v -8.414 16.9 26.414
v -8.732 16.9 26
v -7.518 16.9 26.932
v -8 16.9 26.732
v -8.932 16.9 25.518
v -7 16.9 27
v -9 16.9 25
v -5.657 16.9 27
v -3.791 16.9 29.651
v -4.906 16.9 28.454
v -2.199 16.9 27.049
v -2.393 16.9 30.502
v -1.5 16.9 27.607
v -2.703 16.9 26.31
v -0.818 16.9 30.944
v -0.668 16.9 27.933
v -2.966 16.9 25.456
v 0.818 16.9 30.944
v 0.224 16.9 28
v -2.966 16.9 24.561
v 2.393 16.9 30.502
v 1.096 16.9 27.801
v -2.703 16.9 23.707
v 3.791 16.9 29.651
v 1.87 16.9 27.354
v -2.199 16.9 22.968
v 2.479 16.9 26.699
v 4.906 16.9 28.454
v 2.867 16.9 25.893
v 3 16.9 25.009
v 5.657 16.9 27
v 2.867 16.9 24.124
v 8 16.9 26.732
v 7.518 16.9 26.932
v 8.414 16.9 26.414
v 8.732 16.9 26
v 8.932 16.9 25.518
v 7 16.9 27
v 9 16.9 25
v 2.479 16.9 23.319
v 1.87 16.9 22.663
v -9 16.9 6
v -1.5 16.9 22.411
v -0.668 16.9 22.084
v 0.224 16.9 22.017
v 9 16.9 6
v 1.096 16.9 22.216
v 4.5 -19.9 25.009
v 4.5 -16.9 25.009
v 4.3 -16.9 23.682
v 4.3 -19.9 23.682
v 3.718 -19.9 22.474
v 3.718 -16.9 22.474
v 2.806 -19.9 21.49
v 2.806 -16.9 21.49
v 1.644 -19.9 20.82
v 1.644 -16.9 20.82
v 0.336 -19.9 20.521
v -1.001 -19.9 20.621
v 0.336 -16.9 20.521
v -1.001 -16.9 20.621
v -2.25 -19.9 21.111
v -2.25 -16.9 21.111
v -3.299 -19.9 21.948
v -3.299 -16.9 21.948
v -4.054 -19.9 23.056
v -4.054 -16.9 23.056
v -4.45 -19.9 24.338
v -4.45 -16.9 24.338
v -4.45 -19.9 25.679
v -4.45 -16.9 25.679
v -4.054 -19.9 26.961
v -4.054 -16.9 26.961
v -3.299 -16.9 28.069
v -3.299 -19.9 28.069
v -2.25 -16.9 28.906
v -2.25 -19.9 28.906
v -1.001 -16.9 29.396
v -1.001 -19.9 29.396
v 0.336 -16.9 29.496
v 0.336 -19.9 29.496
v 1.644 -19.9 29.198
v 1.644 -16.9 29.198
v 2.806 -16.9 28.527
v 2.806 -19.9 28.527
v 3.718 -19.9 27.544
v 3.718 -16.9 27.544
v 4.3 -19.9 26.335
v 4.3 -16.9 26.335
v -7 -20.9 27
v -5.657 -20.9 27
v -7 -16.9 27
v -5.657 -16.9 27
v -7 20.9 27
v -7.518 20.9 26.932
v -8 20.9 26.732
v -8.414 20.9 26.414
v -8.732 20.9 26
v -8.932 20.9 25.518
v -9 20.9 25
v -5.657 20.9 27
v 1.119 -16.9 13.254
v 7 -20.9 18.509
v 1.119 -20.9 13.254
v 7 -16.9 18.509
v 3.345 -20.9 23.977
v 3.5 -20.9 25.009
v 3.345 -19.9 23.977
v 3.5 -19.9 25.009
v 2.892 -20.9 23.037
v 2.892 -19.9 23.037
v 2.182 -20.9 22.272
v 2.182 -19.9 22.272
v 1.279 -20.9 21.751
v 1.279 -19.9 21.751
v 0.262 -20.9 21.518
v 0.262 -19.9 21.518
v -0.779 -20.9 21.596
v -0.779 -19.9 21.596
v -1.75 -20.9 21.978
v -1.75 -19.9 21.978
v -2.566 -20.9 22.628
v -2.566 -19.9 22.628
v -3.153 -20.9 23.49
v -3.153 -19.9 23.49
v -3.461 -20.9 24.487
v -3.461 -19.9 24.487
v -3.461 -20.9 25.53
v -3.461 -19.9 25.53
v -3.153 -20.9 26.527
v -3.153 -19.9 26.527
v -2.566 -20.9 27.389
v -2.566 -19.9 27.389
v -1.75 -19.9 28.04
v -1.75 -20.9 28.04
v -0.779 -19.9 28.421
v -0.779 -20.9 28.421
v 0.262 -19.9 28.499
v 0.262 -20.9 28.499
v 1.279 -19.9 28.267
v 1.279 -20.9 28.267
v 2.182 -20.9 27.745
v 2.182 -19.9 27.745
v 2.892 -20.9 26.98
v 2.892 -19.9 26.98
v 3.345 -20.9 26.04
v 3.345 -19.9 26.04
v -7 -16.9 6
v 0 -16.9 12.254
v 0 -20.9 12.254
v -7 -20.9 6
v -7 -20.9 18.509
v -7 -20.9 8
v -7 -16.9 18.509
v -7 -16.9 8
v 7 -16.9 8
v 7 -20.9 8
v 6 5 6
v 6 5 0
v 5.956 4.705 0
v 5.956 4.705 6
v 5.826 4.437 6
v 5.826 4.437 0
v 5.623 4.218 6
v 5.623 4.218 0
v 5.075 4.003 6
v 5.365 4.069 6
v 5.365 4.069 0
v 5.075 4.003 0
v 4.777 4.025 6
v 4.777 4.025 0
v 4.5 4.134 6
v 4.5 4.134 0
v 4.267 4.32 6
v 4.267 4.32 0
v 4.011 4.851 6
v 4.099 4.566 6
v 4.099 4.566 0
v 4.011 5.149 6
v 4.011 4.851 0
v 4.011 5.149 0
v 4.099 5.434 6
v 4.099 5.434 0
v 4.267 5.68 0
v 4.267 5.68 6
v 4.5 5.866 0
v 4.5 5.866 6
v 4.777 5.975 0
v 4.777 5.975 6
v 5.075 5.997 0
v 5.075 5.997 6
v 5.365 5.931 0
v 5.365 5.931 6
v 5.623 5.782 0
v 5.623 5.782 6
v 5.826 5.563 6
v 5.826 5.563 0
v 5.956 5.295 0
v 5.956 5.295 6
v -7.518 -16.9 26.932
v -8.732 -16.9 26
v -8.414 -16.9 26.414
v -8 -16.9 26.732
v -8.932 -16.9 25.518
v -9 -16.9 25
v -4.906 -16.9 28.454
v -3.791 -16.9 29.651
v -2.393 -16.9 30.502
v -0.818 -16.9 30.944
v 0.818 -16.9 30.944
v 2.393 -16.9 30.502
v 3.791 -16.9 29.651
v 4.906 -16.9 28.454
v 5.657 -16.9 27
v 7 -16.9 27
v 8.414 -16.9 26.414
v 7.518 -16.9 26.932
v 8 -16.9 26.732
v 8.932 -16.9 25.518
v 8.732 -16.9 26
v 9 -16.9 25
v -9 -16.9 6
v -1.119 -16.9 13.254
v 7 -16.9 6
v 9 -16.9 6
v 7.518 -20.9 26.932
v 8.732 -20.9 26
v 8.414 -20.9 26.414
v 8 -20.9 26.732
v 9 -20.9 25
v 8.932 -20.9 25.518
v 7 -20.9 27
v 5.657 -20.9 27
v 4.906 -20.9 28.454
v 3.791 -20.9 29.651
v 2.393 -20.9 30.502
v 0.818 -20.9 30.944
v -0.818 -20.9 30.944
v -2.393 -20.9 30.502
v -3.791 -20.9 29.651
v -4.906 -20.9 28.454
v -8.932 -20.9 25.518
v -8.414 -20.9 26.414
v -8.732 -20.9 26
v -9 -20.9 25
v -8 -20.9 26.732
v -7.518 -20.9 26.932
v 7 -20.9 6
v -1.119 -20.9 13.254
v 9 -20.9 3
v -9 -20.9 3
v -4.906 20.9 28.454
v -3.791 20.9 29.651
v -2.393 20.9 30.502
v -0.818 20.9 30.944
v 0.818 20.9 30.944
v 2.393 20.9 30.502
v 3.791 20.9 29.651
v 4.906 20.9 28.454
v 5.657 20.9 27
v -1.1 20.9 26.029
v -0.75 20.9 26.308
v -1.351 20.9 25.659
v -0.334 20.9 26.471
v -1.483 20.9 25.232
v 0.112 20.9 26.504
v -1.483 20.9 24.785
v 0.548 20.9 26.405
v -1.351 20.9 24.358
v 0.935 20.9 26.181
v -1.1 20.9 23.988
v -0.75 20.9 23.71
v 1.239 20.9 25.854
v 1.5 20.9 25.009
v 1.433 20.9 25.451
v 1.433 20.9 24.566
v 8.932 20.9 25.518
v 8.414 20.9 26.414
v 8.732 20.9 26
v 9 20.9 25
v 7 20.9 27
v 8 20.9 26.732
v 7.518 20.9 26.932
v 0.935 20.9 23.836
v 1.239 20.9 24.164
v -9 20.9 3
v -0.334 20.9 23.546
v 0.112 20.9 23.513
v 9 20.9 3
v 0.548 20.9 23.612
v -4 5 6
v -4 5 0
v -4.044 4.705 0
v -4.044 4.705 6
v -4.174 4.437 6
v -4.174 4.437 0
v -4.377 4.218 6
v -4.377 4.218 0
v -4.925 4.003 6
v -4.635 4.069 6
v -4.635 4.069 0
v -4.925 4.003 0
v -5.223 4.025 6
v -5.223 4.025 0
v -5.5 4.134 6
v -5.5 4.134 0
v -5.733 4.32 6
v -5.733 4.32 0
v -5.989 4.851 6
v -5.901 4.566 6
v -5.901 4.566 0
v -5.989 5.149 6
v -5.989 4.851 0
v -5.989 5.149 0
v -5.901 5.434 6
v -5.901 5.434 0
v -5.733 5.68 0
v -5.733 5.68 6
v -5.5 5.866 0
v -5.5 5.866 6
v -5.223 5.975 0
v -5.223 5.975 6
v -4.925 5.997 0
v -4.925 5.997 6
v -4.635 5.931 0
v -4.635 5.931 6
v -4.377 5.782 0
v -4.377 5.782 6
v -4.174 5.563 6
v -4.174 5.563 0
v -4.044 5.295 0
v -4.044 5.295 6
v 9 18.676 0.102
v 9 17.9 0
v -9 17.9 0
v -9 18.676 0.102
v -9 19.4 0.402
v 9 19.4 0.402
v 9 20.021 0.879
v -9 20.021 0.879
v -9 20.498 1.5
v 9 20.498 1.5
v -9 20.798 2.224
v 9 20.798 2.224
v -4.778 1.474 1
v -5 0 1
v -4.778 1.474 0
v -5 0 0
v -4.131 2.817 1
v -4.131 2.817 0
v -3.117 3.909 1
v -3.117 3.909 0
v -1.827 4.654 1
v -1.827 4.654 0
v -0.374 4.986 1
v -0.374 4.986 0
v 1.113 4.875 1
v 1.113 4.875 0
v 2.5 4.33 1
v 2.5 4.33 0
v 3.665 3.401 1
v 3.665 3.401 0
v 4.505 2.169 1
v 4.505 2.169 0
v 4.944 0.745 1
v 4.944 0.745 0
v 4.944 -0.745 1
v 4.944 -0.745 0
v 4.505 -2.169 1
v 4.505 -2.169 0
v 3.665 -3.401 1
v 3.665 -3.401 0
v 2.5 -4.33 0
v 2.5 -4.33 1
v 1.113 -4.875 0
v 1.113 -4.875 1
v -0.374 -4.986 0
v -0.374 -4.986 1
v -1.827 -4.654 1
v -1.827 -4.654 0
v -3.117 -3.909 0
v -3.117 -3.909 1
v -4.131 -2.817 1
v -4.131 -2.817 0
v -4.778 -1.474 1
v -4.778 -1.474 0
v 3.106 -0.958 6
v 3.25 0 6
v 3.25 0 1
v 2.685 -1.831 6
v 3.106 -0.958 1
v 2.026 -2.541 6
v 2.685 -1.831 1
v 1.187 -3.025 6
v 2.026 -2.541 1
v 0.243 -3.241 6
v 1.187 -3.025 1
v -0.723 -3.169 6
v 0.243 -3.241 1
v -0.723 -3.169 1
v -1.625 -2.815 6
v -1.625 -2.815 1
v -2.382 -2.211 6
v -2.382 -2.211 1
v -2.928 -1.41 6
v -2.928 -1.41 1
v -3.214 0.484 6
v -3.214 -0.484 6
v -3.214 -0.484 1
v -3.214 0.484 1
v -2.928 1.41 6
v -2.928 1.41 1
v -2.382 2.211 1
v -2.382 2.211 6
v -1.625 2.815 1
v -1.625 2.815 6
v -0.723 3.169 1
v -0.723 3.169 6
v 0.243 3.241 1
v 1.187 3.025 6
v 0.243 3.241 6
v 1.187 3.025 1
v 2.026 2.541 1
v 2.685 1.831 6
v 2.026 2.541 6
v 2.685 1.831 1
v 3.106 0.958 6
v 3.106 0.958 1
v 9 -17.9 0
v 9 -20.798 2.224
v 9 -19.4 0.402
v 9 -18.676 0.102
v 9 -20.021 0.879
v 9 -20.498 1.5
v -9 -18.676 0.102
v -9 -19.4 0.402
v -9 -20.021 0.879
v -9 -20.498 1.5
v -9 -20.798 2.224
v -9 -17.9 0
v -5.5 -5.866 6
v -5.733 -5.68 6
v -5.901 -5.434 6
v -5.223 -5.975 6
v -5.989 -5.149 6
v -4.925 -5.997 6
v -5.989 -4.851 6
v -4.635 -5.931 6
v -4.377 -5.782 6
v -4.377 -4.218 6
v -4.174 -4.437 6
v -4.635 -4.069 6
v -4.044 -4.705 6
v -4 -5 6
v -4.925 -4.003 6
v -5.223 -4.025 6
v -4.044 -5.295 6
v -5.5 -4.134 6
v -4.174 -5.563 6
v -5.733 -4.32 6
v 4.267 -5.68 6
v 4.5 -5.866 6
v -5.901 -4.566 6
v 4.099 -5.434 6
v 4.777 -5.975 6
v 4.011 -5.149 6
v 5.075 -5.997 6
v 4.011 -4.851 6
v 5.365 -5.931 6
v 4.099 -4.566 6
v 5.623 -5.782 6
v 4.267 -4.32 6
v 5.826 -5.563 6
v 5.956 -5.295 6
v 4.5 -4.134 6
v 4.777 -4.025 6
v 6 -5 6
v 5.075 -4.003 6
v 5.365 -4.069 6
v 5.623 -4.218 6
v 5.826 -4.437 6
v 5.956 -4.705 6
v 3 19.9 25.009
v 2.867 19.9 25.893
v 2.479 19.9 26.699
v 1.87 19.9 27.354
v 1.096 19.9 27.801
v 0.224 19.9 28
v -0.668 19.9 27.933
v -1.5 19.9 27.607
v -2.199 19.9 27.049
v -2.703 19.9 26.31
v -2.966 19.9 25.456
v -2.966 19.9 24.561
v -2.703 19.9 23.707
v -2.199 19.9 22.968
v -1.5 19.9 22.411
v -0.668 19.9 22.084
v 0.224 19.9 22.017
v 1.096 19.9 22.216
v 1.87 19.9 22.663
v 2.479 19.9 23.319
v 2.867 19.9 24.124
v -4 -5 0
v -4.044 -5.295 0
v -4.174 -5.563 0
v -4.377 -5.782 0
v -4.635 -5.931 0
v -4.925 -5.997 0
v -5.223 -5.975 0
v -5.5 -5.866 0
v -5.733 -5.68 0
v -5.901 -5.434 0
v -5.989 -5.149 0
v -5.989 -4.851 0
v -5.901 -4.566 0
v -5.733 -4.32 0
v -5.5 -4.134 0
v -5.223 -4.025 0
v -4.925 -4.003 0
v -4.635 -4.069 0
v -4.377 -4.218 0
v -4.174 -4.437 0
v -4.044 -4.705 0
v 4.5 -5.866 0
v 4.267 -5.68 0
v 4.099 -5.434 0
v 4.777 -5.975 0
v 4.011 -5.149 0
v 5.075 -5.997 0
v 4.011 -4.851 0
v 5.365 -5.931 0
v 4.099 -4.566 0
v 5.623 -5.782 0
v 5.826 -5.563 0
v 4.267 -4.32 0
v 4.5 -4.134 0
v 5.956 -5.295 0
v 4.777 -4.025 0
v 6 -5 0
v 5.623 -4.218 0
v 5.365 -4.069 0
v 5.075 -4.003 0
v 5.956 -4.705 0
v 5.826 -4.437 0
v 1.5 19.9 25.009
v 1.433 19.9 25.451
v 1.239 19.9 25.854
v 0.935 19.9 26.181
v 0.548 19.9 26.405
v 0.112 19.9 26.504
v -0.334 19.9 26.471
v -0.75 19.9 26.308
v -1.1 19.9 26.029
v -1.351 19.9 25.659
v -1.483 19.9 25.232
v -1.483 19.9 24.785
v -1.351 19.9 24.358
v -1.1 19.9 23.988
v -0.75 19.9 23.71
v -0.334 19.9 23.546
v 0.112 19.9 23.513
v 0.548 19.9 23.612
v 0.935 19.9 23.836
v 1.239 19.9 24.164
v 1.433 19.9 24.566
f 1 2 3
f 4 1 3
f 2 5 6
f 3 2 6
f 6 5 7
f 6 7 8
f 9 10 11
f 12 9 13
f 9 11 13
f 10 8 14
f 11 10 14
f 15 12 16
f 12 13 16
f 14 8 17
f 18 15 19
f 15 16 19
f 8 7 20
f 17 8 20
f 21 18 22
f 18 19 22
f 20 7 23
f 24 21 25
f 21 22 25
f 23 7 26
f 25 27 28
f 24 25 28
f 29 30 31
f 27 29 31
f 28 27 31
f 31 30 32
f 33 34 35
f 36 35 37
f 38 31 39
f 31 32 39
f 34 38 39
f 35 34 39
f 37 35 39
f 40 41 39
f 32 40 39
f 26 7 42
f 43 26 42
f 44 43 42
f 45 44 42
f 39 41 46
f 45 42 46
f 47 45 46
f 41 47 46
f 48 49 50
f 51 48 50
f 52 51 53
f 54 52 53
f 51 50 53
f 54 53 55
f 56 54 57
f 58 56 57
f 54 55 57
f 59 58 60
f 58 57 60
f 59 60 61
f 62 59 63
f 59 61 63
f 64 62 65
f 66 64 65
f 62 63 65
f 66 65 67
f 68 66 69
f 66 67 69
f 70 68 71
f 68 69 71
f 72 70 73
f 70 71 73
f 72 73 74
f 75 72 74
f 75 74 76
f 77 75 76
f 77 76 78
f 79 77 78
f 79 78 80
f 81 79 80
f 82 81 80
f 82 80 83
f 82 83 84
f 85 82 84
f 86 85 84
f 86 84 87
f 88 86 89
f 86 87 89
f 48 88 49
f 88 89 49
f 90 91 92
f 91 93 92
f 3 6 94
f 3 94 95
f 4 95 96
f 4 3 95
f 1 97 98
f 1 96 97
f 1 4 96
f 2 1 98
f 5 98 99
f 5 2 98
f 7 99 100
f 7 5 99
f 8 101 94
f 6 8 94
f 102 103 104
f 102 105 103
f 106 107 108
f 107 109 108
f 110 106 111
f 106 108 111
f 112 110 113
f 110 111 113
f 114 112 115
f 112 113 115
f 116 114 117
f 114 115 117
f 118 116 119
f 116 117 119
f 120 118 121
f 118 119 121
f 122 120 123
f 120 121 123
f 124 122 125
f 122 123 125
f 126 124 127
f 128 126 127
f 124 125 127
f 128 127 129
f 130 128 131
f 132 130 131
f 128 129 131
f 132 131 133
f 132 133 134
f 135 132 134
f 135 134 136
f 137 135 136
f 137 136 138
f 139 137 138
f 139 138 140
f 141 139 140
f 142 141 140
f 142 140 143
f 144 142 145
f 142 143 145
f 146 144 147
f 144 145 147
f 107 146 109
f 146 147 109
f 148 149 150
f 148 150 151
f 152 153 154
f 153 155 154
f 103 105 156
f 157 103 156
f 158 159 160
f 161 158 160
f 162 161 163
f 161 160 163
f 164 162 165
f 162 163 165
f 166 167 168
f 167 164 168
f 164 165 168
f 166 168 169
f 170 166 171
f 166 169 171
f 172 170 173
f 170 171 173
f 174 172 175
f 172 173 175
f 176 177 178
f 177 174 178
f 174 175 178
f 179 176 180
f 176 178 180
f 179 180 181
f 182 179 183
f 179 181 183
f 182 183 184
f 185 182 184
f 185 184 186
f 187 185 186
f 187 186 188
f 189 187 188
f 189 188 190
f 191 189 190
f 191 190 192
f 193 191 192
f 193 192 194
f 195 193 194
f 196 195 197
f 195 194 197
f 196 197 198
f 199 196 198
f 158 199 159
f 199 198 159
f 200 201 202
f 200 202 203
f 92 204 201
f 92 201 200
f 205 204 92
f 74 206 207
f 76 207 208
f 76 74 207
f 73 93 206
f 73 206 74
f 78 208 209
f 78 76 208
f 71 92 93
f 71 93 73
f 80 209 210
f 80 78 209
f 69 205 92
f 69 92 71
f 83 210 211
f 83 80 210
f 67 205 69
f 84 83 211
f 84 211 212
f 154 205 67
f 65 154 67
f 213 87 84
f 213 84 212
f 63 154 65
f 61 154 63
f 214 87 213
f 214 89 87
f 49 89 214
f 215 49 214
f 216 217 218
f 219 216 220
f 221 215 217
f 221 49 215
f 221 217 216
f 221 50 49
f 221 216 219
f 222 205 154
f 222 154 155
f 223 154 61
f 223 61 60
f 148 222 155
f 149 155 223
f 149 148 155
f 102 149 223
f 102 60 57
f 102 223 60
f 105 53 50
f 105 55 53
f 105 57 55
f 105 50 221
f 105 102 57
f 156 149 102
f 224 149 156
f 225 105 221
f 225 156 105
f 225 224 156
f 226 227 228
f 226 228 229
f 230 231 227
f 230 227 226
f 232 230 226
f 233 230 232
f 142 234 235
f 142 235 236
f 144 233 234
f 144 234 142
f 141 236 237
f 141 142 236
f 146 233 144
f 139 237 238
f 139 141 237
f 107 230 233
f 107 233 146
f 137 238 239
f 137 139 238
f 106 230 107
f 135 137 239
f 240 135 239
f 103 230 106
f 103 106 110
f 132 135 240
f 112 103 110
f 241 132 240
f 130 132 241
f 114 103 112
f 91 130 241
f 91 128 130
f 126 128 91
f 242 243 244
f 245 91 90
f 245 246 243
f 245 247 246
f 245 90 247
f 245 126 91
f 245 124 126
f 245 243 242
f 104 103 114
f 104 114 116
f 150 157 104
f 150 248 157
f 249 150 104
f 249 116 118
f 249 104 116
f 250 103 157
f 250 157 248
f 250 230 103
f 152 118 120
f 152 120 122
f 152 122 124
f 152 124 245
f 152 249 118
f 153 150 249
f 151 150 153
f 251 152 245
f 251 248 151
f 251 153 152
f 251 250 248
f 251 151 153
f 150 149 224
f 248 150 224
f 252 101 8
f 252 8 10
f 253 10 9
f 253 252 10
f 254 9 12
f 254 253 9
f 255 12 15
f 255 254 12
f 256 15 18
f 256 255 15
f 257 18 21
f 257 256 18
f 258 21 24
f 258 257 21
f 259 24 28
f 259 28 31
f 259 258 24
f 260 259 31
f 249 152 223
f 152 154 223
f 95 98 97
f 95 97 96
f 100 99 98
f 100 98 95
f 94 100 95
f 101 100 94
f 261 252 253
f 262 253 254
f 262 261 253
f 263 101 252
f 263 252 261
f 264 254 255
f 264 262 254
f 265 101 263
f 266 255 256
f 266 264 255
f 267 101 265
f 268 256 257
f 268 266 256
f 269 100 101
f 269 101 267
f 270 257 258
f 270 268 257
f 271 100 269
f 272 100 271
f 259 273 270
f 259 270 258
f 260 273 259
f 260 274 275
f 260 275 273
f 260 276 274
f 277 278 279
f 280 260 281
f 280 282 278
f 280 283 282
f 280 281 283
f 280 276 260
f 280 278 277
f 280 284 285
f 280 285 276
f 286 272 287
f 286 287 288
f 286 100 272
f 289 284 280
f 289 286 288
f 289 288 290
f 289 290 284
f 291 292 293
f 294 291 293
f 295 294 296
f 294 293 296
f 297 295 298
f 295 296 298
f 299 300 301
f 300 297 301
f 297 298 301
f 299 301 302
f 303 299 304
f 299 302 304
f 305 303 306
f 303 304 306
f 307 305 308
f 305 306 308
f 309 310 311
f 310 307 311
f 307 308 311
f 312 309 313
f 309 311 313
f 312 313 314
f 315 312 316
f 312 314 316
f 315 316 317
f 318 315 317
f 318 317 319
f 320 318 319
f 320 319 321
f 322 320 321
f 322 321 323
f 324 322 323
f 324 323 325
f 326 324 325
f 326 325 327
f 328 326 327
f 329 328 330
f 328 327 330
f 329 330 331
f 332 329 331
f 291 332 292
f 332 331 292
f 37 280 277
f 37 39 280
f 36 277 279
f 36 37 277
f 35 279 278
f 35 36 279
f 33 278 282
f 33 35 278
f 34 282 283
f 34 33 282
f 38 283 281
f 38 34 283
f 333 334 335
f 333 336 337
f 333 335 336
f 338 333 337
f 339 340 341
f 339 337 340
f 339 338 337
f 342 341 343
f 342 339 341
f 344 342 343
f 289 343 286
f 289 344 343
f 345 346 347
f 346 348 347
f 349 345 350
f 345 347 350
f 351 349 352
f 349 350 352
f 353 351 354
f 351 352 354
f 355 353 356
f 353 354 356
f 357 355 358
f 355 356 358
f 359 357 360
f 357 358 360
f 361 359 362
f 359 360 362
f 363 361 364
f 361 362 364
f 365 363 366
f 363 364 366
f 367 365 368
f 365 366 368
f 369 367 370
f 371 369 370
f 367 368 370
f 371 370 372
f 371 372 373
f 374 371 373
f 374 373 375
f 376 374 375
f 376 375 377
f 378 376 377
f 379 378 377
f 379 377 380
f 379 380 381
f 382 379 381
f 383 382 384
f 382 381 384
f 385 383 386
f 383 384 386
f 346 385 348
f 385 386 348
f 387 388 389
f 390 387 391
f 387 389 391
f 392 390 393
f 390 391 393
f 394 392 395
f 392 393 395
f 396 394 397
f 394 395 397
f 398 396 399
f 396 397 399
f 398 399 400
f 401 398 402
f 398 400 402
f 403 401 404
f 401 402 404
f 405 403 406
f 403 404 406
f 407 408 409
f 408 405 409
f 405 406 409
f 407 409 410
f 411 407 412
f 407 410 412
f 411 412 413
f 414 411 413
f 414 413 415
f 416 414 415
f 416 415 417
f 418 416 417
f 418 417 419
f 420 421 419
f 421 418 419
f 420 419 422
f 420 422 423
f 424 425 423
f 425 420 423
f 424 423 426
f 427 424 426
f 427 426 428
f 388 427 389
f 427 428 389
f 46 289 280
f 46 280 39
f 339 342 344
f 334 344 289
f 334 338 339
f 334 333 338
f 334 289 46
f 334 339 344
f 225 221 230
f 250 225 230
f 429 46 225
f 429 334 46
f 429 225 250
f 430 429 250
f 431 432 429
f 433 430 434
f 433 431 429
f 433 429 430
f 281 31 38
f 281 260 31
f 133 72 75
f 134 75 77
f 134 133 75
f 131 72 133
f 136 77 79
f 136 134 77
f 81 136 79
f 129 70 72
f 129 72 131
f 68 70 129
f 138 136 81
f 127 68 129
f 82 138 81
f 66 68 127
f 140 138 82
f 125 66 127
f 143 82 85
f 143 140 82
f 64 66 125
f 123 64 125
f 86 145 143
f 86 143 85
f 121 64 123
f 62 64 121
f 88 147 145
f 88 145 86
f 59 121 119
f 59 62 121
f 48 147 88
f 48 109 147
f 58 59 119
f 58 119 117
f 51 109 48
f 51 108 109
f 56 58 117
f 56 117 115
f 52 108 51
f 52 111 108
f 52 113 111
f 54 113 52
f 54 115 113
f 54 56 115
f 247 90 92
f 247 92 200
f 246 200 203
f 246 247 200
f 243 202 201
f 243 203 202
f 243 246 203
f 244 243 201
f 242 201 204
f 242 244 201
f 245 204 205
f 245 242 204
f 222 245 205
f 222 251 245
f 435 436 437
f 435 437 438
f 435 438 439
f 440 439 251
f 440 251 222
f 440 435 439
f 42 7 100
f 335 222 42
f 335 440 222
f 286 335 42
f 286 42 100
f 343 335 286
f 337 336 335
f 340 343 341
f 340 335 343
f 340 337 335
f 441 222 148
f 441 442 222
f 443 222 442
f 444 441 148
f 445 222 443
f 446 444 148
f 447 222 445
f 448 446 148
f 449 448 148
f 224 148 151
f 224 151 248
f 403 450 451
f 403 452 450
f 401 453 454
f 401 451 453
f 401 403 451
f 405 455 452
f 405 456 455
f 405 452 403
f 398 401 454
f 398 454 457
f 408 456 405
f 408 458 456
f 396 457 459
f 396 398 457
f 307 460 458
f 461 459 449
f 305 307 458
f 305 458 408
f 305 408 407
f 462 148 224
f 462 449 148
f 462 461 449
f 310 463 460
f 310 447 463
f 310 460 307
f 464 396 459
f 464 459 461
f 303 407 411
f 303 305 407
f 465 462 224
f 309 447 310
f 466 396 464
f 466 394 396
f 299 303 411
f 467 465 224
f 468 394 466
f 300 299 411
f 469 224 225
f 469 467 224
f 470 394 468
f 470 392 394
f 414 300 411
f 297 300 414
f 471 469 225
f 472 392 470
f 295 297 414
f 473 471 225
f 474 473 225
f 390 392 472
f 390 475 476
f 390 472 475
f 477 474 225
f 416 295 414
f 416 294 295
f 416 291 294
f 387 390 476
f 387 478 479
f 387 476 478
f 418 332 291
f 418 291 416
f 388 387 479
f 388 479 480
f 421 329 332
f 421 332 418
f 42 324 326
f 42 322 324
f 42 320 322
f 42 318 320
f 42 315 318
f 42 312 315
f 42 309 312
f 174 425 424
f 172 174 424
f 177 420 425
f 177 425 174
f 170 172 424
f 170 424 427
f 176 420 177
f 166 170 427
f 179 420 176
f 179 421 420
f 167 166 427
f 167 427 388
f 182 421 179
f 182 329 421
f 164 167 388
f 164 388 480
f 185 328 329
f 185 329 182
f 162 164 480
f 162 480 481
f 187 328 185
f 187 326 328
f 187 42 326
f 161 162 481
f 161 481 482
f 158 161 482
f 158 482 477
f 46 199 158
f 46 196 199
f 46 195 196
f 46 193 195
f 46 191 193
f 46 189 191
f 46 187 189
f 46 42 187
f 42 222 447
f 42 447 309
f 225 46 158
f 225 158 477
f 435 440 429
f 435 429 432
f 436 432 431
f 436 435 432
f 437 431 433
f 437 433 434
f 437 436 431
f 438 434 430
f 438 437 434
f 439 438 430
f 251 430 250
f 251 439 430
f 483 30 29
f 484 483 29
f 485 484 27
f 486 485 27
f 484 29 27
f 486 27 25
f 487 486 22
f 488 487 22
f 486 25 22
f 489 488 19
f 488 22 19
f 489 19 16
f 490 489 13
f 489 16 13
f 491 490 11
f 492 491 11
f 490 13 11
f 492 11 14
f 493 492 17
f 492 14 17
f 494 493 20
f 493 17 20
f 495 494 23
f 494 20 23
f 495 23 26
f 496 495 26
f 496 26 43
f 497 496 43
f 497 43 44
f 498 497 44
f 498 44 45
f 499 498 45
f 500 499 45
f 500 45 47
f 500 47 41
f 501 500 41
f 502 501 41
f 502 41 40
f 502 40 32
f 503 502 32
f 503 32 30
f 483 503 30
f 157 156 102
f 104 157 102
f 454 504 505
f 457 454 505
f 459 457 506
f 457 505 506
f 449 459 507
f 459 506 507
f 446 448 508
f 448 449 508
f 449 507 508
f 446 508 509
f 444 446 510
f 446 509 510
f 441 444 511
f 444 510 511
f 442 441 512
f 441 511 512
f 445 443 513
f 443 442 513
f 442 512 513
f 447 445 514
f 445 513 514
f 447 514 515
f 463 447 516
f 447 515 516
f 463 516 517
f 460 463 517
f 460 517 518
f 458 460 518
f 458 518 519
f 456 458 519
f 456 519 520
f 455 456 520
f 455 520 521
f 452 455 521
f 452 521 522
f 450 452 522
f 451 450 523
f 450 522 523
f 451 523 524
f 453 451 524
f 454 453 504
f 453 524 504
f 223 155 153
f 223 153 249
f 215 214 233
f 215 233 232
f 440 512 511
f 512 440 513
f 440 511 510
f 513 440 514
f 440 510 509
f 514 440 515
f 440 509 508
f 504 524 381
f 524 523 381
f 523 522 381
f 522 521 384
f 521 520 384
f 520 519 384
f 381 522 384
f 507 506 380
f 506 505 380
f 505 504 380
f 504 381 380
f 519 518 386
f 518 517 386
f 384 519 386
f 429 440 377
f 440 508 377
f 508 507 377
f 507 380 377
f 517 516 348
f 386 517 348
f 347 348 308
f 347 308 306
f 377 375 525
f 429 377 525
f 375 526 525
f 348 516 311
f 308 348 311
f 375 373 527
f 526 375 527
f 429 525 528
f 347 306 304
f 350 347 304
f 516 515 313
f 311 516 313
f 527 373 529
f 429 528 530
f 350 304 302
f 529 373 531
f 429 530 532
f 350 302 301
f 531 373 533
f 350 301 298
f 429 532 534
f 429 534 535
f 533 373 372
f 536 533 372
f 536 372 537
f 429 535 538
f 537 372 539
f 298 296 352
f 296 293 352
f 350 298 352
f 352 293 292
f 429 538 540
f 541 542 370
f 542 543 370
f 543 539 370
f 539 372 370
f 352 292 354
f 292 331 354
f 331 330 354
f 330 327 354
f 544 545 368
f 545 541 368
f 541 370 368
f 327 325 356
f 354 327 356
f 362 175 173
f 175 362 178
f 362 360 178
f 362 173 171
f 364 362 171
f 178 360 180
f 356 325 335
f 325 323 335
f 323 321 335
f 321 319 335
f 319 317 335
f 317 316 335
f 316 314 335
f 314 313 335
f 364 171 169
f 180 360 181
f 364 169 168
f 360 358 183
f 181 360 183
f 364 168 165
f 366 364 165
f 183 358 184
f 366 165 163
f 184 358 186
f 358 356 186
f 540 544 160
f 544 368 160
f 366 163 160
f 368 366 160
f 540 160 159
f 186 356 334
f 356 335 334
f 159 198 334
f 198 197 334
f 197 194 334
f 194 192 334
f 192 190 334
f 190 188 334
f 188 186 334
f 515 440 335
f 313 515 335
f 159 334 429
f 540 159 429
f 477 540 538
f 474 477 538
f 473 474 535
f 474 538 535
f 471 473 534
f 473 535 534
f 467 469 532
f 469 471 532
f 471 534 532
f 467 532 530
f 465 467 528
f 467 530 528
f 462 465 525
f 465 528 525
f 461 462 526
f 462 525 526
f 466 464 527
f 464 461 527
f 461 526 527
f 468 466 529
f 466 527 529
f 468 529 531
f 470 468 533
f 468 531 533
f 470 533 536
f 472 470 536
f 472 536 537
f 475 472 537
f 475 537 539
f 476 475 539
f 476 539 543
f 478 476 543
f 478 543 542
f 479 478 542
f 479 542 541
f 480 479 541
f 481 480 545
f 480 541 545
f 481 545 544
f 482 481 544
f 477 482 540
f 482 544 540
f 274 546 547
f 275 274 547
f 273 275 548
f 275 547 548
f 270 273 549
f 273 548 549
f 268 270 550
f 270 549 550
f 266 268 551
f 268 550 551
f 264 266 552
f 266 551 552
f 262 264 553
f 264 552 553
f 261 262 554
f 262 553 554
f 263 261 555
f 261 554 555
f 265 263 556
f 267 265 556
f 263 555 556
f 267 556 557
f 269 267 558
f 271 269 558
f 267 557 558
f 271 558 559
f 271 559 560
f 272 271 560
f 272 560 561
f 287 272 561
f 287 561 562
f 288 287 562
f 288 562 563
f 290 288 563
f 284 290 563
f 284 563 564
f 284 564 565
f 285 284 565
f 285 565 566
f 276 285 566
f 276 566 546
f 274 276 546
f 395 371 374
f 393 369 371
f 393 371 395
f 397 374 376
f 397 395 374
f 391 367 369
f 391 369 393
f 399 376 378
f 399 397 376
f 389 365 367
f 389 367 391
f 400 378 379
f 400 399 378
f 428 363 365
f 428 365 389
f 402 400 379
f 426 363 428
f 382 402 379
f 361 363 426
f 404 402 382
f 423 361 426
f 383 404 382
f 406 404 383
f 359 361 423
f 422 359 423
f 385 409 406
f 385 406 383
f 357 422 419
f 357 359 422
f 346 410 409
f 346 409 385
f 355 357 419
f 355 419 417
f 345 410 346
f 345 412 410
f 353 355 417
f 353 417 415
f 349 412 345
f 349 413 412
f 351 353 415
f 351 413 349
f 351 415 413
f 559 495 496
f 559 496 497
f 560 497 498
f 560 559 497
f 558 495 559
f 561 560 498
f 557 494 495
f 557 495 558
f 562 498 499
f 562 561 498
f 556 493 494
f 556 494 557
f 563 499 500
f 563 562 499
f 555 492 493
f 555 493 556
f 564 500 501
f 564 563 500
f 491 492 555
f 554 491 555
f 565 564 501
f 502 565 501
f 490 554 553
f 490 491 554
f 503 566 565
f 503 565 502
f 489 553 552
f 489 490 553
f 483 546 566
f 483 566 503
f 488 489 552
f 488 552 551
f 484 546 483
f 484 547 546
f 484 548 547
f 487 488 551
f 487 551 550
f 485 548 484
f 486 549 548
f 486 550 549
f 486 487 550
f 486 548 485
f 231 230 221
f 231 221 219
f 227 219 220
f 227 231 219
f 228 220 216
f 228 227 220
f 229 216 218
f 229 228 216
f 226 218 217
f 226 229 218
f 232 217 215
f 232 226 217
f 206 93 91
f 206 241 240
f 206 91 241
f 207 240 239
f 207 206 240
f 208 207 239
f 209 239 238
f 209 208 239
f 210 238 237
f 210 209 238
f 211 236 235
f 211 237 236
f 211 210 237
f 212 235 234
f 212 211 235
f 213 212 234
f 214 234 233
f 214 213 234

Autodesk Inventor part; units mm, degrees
ref_plane "YZ Plane" through (0, 0, 0) normal (1, 0, 0) x (0, 1, 0)
ref_plane "XZ Plane" through (0, 0, 0) normal (0, 1, 0) x (-1, 0, 0)
ref_plane "XY Plane" through (0, 0, 0) normal (0, 0, 1) x (1, 0, 0)
sketch "スケッチ1" plane through (0, 0, 0) normal (0, 0, 1) x (1, 0, 0)
  line L0 (-9, 20.9) -> (9, 20.9)
  line L1 (9, 20.9) -> (9, -20.9)
  line L2 (9, -20.9) -> (-9, -20.9)
  line L3 (-9, -20.9) -> (-9, 20.9)
  line L4 (-9, 20.9) -> (9, -20.9) construction
  line L5 (9, 20.9) -> (-9, -20.9) construction
  circle A0 centre (0, 0) radius 3.25
  line L6 (-5, 5) -> (5, 5) construction
  line L7 (5, 5) -> (5, -5) construction
  line L8 (5, -5) -> (-5, -5) construction
  line L9 (-5, -5) -> (-5, 5) construction
  line L10 (-5, 5) -> (5, -5) construction
  line L11 (5, 5) -> (-5, -5) construction
  circle A1 centre (5, 5) radius 1
  circle A2 centre (-5, 5) radius 1
  circle A3 centre (-5, -5) radius 1
  circle A4 centre (5, -5) radius 1
  dimension "d0" = 18
  dimension "d1" = 41.8
  dimension "d2" = 6.5
  dimension "d3" = 10
  dimension "d4" = 10
  dimension "d5" = 2
  dimension "d6" = 2
  dimension "d7" = 2
  dimension "d8" = 2
extrude "押し出し1" add sketch "スケッチ1" along normal blind 6
sketch "スケッチ2" plane through (0, 0, 6) normal (0, 0, 1) x (1, 0, 0)
  line L0 (-9, 20.9) -> (9, 20.9)
  line L1 (-9, 9) -> (-9, 20.9)
  line L2 (9, 20.9) -> (-9, 20.9)
  line L3 (-9, 20.9) -> (-9, 16.9)
  line L4 (-9, 16.9) -> (9, 16.9)
  line L5 (9, 16.9) -> (9, 20.9)
  line L6 (9, -9) -> (9, -20.9)
  line L7 (-9, -20.9) -> (-9, -9)
  line L8 (9, -20.9) -> (-9, -20.9)
  line L9 (-9, -20.9) -> (-9, -16.9)
  line L10 (-9, -16.9) -> (9, -16.9)
  line L11 (9, -16.9) -> (9, -20.9)
  point P0 (0, 0)
  point P1 (0, 0)
  dimension "d11" = 4
  dimension "d12" = 4
extrude "押し出し2" add sketch "スケッチ2" along normal blind 25
sketch "スケッチ3" plane through (-9, 20.9, 0) normal (0, 1, 0) x (1, 0, 0)
  line L0 (18, -31) -> (18, 0)
  line L1 (0, 0) -> (18, 0)
  line L2 (18, 0) -> (0, 0)
  line L3 (18, -31) -> (18, -25) construction
  line L4 (18, -25) -> (18, -31)
  line L5 (9, -25) -> (15, -25) construction
  line L6 (9, -25) -> (18, -25) construction
  line L7 (16, -27) -> (18, -27)
  line L8 (14.6569, -27) -> (16, -27)
  line L9 (9, -25) -> (9, -31) construction
  line L10 (2, -27) -> (3.3431, -27)
  line L11 (9, -25) -> (0, -25) construction
  line L12 (0, -25) -> (0, -31) construction
  line L13 (0, -25) -> (0, -31)
  circle A0 centre (9, -25) radius 6
  line L14 (18, -6) -> (18, -31)
  line L15 (0, -6) -> (0, -31) construction
  line L16 (18, 0) -> (18, -31) construction
  line L17 (9, 0) -> (9, -25) construction
  line L18 (0, 0) -> (0, -31)
  line L19 (0, -6) -> (0, -31) construction
  line L20 (18, -31) -> (0, -31) construction
  line L21 (0, -31) -> (18, -31) construction
  line L22 (0, -31) -> (18, -31)
  line L23 (18, -31) -> (0, -31) construction
  line L24 (0, -31) -> (18, -31) construction
  line L25 (0, -25) -> (2, -25) construction
  line L26 (2, -25) -> (0, -25) construction
  line L27 (18, -25) -> (16, -25) construction
  line L28 (2, -27) -> (0, -27)
  line L29 (18, -31) -> (18, 0)
  line L30 (0, 0) -> (18, 0)
  line L31 (18, 0) -> (0, 0)
  line L32 (18, -31) -> (18, -25) construction
  line L33 (18, -25) -> (18, -31)
  line L34 (9, -25) -> (15, -25) construction
  line L35 (9, -25) -> (18, -25) construction
  line L36 (16, -27) -> (18, -27)
  line L37 (14.6569, -27) -> (16, -27)
  line L38 (9, -25) -> (9, -31) construction
  line L39 (2, -27) -> (3.3431, -27)
  line L40 (9, -25) -> (0, -25) construction
  line L41 (0, -25) -> (0, -31) construction
  line L42 (0, -25) -> (0, -31)
  circle A1 centre (9, -25) radius 6
  line L43 (18, -6) -> (18, -31)
  line L44 (0, -6) -> (0, -31) construction
  line L45 (18, 0) -> (18, -31) construction
  line L46 (9, 0) -> (9, -25) construction
  line L47 (0, 0) -> (0, -31)
  line L48 (0, -6) -> (0, -31) construction
  line L49 (18, -31) -> (0, -31) construction
  line L50 (0, -31) -> (18, -31) construction
  line L51 (0, -31) -> (18, -31)
  line L52 (18, -31) -> (0, -31) construction
  line L53 (0, -31) -> (18, -31) construction
  line L54 (0, -25) -> (2, -25) construction
  line L55 (2, -25) -> (0, -25) construction
  line L56 (18, -25) -> (16, -25) construction
  line L57 (2, -27) -> (0, -27)
  point P0 (9, -6)
  point P1 (9, -6)
extrude "押し出し3" cut sketch "スケッチ3" against normal blind 42 contours L22 A0 L8 L7 L0 | L22 L13 L28 L10 A0
sketch "スケッチ4" plane through (-9, 16.9, 6) normal (0, -1, 0) x (1, 0, 0)
  line L0 (0, 25.0086) -> (0, 19.0086)
  line L1 (0, 25.0086) -> (0, 19.0086) construction
  line L2 (0, 19.0086) -> (0, 25.0086)
  line L3 (9, 19.0086) -> (3, 19.0086) construction
  line L4 (9, 19.0086) -> (0, 19.0086) construction
  line L5 (2, 21.0086) -> (0, 21.0086)
  line L6 (3.3431, 21.0086) -> (2, 21.0086)
  line L7 (9, 19.0086) -> (9, 25.0086) construction
  line L8 (16, 21.0086) -> (14.6569, 21.0086)
  line L9 (9, 19.0086) -> (18, 19.0086) construction
  line L10 (18, 19.0086) -> (18, 25.0086) construction
  line L11 (18, 19.0086) -> (18, 25.0086)
  circle A0 centre (9, 19.0086) radius 6
  line L12 (0, 19.0086) -> (0, 25.0086)
  line L13 (18, 19.0086) -> (18, 25.0086) construction
  line L14 (0, 19.0086) -> (0, 25.0086) construction
  line L15 (9, 0) -> (9, 25) construction
  line L16 (18, 19.0086) -> (18, 25.0086)
  line L17 (18, 0.0086) -> (18, 25.0086) construction
  line L18 (0, 25.0086) -> (18, 25.0086) construction
  line L19 (18, 25.0086) -> (0, 25.0086) construction
  line L20 (18, 25.0086) -> (0, 25.0086)
  line L21 (0, 25.0086) -> (18, 25.0086) construction
  line L22 (18, 25.0086) -> (0, 25.0086) construction
  line L23 (18, 19.0086) -> (16, 19.0086) construction
  line L24 (16, 19.0086) -> (18, 19.0086) construction
  line L25 (0, 19.0086) -> (2, 19.0086) construction
  line L26 (16, 21.0086) -> (18, 21.0086)
  circle A1 centre (9, 19.0086) radius 1.5
  circle A2 centre (9, 19.0086) radius 3
  point P0 (9, -6)
  point P1 (9, 0.0086)
  dimension "d17" = 3
  dimension "d18" = 6
extrude "押し出し4" cut sketch "スケッチ4" against normal blind 3 contours A2
sketch "スケッチ5" plane through (-9, 16.9, 6) normal (0, -1, 0) x (1, 0, 0)
  line L0 (0, 25.0086) -> (0, 19.0086)
  line L1 (0, 25.0086) -> (0, 19.0086) construction
  line L2 (0, 19.0086) -> (0, 25.0086)
  line L3 (9, 19.0086) -> (3, 19.0086) construction
  line L4 (9, 19.0086) -> (0, 19.0086) construction
  line L5 (2, 21.0086) -> (0, 21.0086)
  line L6 (3.3431, 21.0086) -> (2, 21.0086)
  line L7 (9, 19.0086) -> (9, 25.0086) construction
  line L8 (16, 21.0086) -> (14.6569, 21.0086)
  line L9 (9, 19.0086) -> (18, 19.0086) construction
  line L10 (18, 19.0086) -> (18, 25.0086) construction
  line L11 (18, 19.0086) -> (18, 25.0086)
  circle A0 centre (9, 19.0086) radius 6
  line L12 (0, 19.0086) -> (0, 25.0086)
  line L13 (18, 19.0086) -> (18, 25.0086) construction
  line L14 (0, 19.0086) -> (0, 25.0086) construction
  line L15 (9, 0) -> (9, 25) construction
  line L16 (18, 19.0086) -> (18, 25.0086)
  line L17 (18, 0.0086) -> (18, 25.0086) construction
  line L18 (0, 25.0086) -> (18, 25.0086) construction
  line L19 (18, 25.0086) -> (0, 25.0086) construction
  line L20 (18, 25.0086) -> (0, 25.0086)
  line L21 (0, 25.0086) -> (18, 25.0086) construction
  line L22 (18, 25.0086) -> (0, 25.0086) construction
  line L23 (18, 19.0086) -> (16, 19.0086) construction
  line L24 (16, 19.0086) -> (18, 19.0086) construction
  line L25 (0, 19.0086) -> (2, 19.0086) construction
  line L26 (16, 21.0086) -> (18, 21.0086)
  circle A1 centre (9, 19.0086) radius 1.5
  circle A2 centre (9, 19.0086) radius 3
  point P0 (9, -6)
  point P1 (9, -6)
  point P2 (9, 0.0086)
  dimension "d21" = 3
  dimension "d22" = 6
extrude "押し出し5" cut sketch "スケッチ5" against normal blind 4 contours A1
sketch "スケッチ6" plane through (-9, -16.9, 6) normal (0, 1, 0) x (1, 0, 0)
  line L0 (18, -25.0086) -> (18, -19.0086)
  line L1 (18, -25.0086) -> (18, -19.0086) construction
  line L2 (18, -19.0086) -> (18, -25.0086)
  line L3 (9, -19.0086) -> (15, -19.0086) construction
  line L4 (9, -19.0086) -> (18, -19.0086) construction
  line L5 (16, -21.0086) -> (18, -21.0086)
  line L6 (14.6569, -21.0086) -> (16, -21.0086)
  line L7 (9, -19.0086) -> (9, -25.0086) construction
  line L8 (2, -21.0086) -> (3.3431, -21.0086)
  line L9 (9, -19.0086) -> (0, -19.0086) construction
  line L10 (0, -19.0086) -> (0, -25.0086) construction
  line L11 (0, -19.0086) -> (0, -25.0086)
  circle A0 centre (9, -19.0086) radius 6
  line L12 (18, -19.0086) -> (18, -25.0086)
  line L13 (0, -19.0086) -> (0, -25.0086) construction
  line L14 (18, -19.0086) -> (18, -25.0086) construction
  line L15 (9, 0) -> (9, -25) construction
  line L16 (0, -19.0086) -> (0, -25.0086)
  line L17 (0, -0.0086) -> (0, -25.0086) construction
  line L18 (18, -25.0086) -> (0, -25.0086) construction
  line L19 (0, -25.0086) -> (18, -25.0086) construction
  line L20 (0, -25.0086) -> (18, -25.0086)
  line L21 (18, -25.0086) -> (0, -25.0086) construction
  line L22 (0, -25.0086) -> (18, -25.0086) construction
  line L23 (0, -19.0086) -> (2, -19.0086) construction
  line L24 (2, -19.0086) -> (0, -19.0086) construction
  line L25 (18, -19.0086) -> (16, -19.0086) construction
  line L26 (2, -21.0086) -> (0, -21.0086)
  circle A1 centre (9, -19.0086) radius 3.5
  circle A2 centre (9, -19.0086) radius 4.5
  line L27 (18, -25.0086) -> (18, -19.0086)
  line L28 (18, -25.0086) -> (18, -19.0086) construction
  line L29 (18, -19.0086) -> (18, -25.0086)
  line L30 (9, -19.0086) -> (15, -19.0086) construction
  line L31 (9, -19.0086) -> (18, -19.0086) construction
  line L32 (16, -21.0086) -> (18, -21.0086)
  line L33 (14.6569, -21.0086) -> (16, -21.0086)
  line L34 (9, -19.0086) -> (9, -25.0086) construction
  line L35 (2, -21.0086) -> (3.3431, -21.0086)
  line L36 (9, -19.0086) -> (0, -19.0086) construction
  line L37 (0, -19.0086) -> (0, -25.0086) construction
  line L38 (0, -19.0086) -> (0, -25.0086)
  circle A3 centre (9, -19.0086) radius 6
  line L39 (18, -19.0086) -> (18, -25.0086)
  line L40 (0, -19.0086) -> (0, -25.0086) construction
  line L41 (18, -19.0086) -> (18, -25.0086) construction
  line L42 (9, 0) -> (9, -25) construction
  line L43 (0, -19.0086) -> (0, -25.0086)
  line L44 (0, -0.0086) -> (0, -25.0086) construction
  line L45 (18, -25.0086) -> (0, -25.0086) construction
  line L46 (0, -25.0086) -> (18, -25.0086) construction
  line L47 (0, -25.0086) -> (18, -25.0086)
  line L48 (18, -25.0086) -> (0, -25.0086) construction
  line L49 (0, -25.0086) -> (18, -25.0086) construction
  line L50 (0, -19.0086) -> (2, -19.0086) construction
  line L51 (2, -19.0086) -> (0, -19.0086) construction
  line L52 (18, -19.0086) -> (16, -19.0086) construction
  line L53 (2, -21.0086) -> (0, -21.0086)
  circle A4 centre (9, -19.0086) radius 3.5
  circle A5 centre (9, -19.0086) radius 4.5
  point P0 (9, 6)
  point P1 (9, -0.0086)
  point P2 (9, -0.0086)
  dimension "d25" = 7
  dimension "d26" = 9
  dimension "d27" = 7
  dimension "d28" = 9
extrude "押し出し6" cut sketch "スケッチ6" against normal blind 3 contours A2
sketch "スケッチ7" plane through (-9, -16.9, 6) normal (0, 1, 0) x (1, 0, 0)
  line L0 (18, -25.0086) -> (18, -19.0086)
  line L1 (18, -25.0086) -> (18, -19.0086) construction
  line L2 (18, -19.0086) -> (18, -25.0086)
  line L3 (9, -19.0086) -> (15, -19.0086) construction
  line L4 (9, -19.0086) -> (18, -19.0086) construction
  line L5 (16, -21.0086) -> (18, -21.0086)
  line L6 (14.6569, -21.0086) -> (16, -21.0086)
  line L7 (9, -19.0086) -> (9, -25.0086) construction
  line L8 (2, -21.0086) -> (3.3431, -21.0086)
  line L9 (9, -19.0086) -> (0, -19.0086) construction
  line L10 (0, -19.0086) -> (0, -25.0086) construction
  line L11 (0, -19.0086) -> (0, -25.0086)
  circle A0 centre (9, -19.0086) radius 6
  line L12 (18, -19.0086) -> (18, -25.0086)
  line L13 (0, -19.0086) -> (0, -25.0086) construction
  line L14 (18, -19.0086) -> (18, -25.0086) construction
  line L15 (9, 0) -> (9, -25) construction
  line L16 (0, -19.0086) -> (0, -25.0086)
  line L17 (0, -0.0086) -> (0, -25.0086) construction
  line L18 (18, -25.0086) -> (0, -25.0086) construction
  line L19 (0, -25.0086) -> (18, -25.0086) construction
  line L20 (0, -25.0086) -> (18, -25.0086)
  line L21 (18, -25.0086) -> (0, -25.0086) construction
  line L22 (0, -25.0086) -> (18, -25.0086) construction
  line L23 (0, -19.0086) -> (2, -19.0086) construction
  line L24 (2, -19.0086) -> (0, -19.0086) construction
  line L25 (18, -19.0086) -> (16, -19.0086) construction
  line L26 (2, -21.0086) -> (0, -21.0086)
  circle A1 centre (9, -19.0086) radius 3.5
  circle A2 centre (9, -19.0086) radius 4.5
  line L27 (18, -25.0086) -> (18, -19.0086)
  line L28 (18, -25.0086) -> (18, -19.0086) construction
  line L29 (18, -19.0086) -> (18, -25.0086)
  line L30 (9, -19.0086) -> (15, -19.0086) construction
  line L31 (9, -19.0086) -> (18, -19.0086) construction
  line L32 (16, -21.0086) -> (18, -21.0086)
  line L33 (14.6569, -21.0086) -> (16, -21.0086)
  line L34 (9, -19.0086) -> (9, -25.0086) construction
  line L35 (2, -21.0086) -> (3.3431, -21.0086)
  line L36 (9, -19.0086) -> (0, -19.0086) construction
  line L37 (0, -19.0086) -> (0, -25.0086) construction
  line L38 (0, -19.0086) -> (0, -25.0086)
  circle A3 centre (9, -19.0086) radius 6
  line L39 (18, -19.0086) -> (18, -25.0086)
  line L40 (0, -19.0086) -> (0, -25.0086) construction
  line L41 (18, -19.0086) -> (18, -25.0086) construction
  line L42 (9, 0) -> (9, -25) construction
  line L43 (0, -19.0086) -> (0, -25.0086)
  line L44 (0, -0.0086) -> (0, -25.0086) construction
  line L45 (18, -25.0086) -> (0, -25.0086) construction
  line L46 (0, -25.0086) -> (18, -25.0086) construction
  line L47 (0, -25.0086) -> (18, -25.0086)
  line L48 (18, -25.0086) -> (0, -25.0086) construction
  line L49 (0, -25.0086) -> (18, -25.0086) construction
  line L50 (0, -19.0086) -> (2, -19.0086) construction
  line L51 (2, -19.0086) -> (0, -19.0086) construction
  line L52 (18, -19.0086) -> (16, -19.0086) construction
  line L53 (2, -21.0086) -> (0, -21.0086)
  circle A4 centre (9, -19.0086) radius 3.5
  circle A5 centre (9, -19.0086) radius 4.5
  point P0 (9, 6)
  point P1 (9, 6)
  point P2 (9, -0.0086)
  point P3 (9, -0.0086)
  dimension "d31" = 7
  dimension "d32" = 9
  dimension "d33" = 7
  dimension "d34" = 9
extrude "押し出し7" cut sketch "スケッチ7" against normal blind 4 contours A1
sketch "スケッチ8" plane through (-9, -16.9, 6) normal (0, 1, 0) x (1, 0, 0)
  line L0 (18, -25.0086) -> (18, -19.0086)
  line L1 (18, -25.0086) -> (18, -19.0086) construction
  line L2 (18, -19.0086) -> (18, -25.0086)
  line L3 (9, -19.0086) -> (15, -19.0086) construction
  line L4 (9, -19.0086) -> (18, -19.0086) construction
  line L5 (16, -21.0086) -> (18, -21.0086)
  line L6 (14.6569, -21.0086) -> (16, -21.0086)
  line L7 (9, -19.0086) -> (9, -25.0086) construction
  line L8 (2, -21.0086) -> (3.3431, -21.0086)
  line L9 (9, -19.0086) -> (0, -19.0086) construction
  line L10 (0, -19.0086) -> (0, -25.0086) construction
  line L11 (0, -19.0086) -> (0, -25.0086)
  circle A0 centre (9, -19.0086) radius 6
  line L12 (18, -19.0086) -> (18, -25.0086)
  line L13 (0, -19.0086) -> (0, -25.0086) construction
  line L14 (18, -19.0086) -> (18, -25.0086) construction
  line L15 (9, 0) -> (9, -25) construction
  line L16 (0, -19.0086) -> (0, -25.0086)
  line L17 (0, -0.0086) -> (0, -25.0086) construction
  line L18 (18, -25.0086) -> (0, -25.0086) construction
  line L19 (0, -25.0086) -> (18, -25.0086) construction
  line L20 (0, -25.0086) -> (18, -25.0086)
  line L21 (18, -25.0086) -> (0, -25.0086) construction
  line L22 (0, -25.0086) -> (18, -25.0086) construction
  line L23 (0, -19.0086) -> (2, -19.0086) construction
  line L24 (2, -19.0086) -> (0, -19.0086) construction
  line L25 (18, -19.0086) -> (16, -19.0086) construction
  line L26 (2, -21.0086) -> (0, -21.0086)
  circle A1 centre (9, -19.0086) radius 3.5
  circle A2 centre (9, -19.0086) radius 4.5
  line L27 (18, -19.0086) -> (16, -19.0086) construction
  line L28 (0, 0) -> (18, 0) construction
  line L29 (18, 0) -> (18, -21) construction
  line L30 (0, 0) -> (18, 0) construction
  line L31 (18, 0) -> (18, -14.5086) construction
  line L32 (0, -14.5086) -> (0, 0) construction
  line L33 (18, 0) -> (16, 0) construction
  line L34 (0, 0) -> (2, 0) construction
  line L35 (16, 0) -> (2, 0)
  line L36 (2, -2) -> (2, -12.5086)
  line L37 (16, -12.5086) -> (16, -2)
  line L38 (16, -12.5086) -> (10.1192, -7.2543)
  line L39 (9, -6.2543) -> (2, 0)
  line L40 (16, -2) -> (10.1192, -7.2543)
  line L41 (9, -8.2543) -> (2, -14.5086)
  line L42 (2, -12.5086) -> (7.8808, -7.2543)
  line L43 (9, -6.2543) -> (16, 0)
  line L44 (2, -2) -> (7.8808, -7.2543)
  line L45 (9, -8.2543) -> (16, -14.5086)
  line L46 (2, -14.5086) -> (9, -14.5086)
  line L47 (12.9686, -14.5086) -> (16, -14.5086)
  line L48 (18, -14.5086) -> (9, -14.5086) construction
  line L49 (5.0314, -14.5086) -> (0, -14.5086) construction
  point P0 (9, 6)
  point P1 (9, -0.0086)
  dimension "d38" = 9
  dimension "d37" = 7
  dimension "d39" = 2
  dimension "d40" = 2
extrude "押し出し8" cut sketch "スケッチ8" against normal blind 4 contours L43 L39 L35 | L44 L42 L36 | L38 L40 L37
fillet "フィレット1" radius 2 4 edges at (-9, 18.9, 27) (-9, -18.9, 27) (9, -18.9, 27) (9, 18.9, 27)
fillet "フィレット2" radius 3 2 edges at (0, -20.9, 0) (0, 20.9, 0)
sketch "スケッチ9" plane through (0, 0, 0) normal (0, 0, -1) x (-1, 0, 0)
  circle A0 centre (0, 0) radius 5
  dimension "d45" = 10
extrude "押し出し9" cut sketch "スケッチ9" against normal blind 1
properties part number "ServoArm"
